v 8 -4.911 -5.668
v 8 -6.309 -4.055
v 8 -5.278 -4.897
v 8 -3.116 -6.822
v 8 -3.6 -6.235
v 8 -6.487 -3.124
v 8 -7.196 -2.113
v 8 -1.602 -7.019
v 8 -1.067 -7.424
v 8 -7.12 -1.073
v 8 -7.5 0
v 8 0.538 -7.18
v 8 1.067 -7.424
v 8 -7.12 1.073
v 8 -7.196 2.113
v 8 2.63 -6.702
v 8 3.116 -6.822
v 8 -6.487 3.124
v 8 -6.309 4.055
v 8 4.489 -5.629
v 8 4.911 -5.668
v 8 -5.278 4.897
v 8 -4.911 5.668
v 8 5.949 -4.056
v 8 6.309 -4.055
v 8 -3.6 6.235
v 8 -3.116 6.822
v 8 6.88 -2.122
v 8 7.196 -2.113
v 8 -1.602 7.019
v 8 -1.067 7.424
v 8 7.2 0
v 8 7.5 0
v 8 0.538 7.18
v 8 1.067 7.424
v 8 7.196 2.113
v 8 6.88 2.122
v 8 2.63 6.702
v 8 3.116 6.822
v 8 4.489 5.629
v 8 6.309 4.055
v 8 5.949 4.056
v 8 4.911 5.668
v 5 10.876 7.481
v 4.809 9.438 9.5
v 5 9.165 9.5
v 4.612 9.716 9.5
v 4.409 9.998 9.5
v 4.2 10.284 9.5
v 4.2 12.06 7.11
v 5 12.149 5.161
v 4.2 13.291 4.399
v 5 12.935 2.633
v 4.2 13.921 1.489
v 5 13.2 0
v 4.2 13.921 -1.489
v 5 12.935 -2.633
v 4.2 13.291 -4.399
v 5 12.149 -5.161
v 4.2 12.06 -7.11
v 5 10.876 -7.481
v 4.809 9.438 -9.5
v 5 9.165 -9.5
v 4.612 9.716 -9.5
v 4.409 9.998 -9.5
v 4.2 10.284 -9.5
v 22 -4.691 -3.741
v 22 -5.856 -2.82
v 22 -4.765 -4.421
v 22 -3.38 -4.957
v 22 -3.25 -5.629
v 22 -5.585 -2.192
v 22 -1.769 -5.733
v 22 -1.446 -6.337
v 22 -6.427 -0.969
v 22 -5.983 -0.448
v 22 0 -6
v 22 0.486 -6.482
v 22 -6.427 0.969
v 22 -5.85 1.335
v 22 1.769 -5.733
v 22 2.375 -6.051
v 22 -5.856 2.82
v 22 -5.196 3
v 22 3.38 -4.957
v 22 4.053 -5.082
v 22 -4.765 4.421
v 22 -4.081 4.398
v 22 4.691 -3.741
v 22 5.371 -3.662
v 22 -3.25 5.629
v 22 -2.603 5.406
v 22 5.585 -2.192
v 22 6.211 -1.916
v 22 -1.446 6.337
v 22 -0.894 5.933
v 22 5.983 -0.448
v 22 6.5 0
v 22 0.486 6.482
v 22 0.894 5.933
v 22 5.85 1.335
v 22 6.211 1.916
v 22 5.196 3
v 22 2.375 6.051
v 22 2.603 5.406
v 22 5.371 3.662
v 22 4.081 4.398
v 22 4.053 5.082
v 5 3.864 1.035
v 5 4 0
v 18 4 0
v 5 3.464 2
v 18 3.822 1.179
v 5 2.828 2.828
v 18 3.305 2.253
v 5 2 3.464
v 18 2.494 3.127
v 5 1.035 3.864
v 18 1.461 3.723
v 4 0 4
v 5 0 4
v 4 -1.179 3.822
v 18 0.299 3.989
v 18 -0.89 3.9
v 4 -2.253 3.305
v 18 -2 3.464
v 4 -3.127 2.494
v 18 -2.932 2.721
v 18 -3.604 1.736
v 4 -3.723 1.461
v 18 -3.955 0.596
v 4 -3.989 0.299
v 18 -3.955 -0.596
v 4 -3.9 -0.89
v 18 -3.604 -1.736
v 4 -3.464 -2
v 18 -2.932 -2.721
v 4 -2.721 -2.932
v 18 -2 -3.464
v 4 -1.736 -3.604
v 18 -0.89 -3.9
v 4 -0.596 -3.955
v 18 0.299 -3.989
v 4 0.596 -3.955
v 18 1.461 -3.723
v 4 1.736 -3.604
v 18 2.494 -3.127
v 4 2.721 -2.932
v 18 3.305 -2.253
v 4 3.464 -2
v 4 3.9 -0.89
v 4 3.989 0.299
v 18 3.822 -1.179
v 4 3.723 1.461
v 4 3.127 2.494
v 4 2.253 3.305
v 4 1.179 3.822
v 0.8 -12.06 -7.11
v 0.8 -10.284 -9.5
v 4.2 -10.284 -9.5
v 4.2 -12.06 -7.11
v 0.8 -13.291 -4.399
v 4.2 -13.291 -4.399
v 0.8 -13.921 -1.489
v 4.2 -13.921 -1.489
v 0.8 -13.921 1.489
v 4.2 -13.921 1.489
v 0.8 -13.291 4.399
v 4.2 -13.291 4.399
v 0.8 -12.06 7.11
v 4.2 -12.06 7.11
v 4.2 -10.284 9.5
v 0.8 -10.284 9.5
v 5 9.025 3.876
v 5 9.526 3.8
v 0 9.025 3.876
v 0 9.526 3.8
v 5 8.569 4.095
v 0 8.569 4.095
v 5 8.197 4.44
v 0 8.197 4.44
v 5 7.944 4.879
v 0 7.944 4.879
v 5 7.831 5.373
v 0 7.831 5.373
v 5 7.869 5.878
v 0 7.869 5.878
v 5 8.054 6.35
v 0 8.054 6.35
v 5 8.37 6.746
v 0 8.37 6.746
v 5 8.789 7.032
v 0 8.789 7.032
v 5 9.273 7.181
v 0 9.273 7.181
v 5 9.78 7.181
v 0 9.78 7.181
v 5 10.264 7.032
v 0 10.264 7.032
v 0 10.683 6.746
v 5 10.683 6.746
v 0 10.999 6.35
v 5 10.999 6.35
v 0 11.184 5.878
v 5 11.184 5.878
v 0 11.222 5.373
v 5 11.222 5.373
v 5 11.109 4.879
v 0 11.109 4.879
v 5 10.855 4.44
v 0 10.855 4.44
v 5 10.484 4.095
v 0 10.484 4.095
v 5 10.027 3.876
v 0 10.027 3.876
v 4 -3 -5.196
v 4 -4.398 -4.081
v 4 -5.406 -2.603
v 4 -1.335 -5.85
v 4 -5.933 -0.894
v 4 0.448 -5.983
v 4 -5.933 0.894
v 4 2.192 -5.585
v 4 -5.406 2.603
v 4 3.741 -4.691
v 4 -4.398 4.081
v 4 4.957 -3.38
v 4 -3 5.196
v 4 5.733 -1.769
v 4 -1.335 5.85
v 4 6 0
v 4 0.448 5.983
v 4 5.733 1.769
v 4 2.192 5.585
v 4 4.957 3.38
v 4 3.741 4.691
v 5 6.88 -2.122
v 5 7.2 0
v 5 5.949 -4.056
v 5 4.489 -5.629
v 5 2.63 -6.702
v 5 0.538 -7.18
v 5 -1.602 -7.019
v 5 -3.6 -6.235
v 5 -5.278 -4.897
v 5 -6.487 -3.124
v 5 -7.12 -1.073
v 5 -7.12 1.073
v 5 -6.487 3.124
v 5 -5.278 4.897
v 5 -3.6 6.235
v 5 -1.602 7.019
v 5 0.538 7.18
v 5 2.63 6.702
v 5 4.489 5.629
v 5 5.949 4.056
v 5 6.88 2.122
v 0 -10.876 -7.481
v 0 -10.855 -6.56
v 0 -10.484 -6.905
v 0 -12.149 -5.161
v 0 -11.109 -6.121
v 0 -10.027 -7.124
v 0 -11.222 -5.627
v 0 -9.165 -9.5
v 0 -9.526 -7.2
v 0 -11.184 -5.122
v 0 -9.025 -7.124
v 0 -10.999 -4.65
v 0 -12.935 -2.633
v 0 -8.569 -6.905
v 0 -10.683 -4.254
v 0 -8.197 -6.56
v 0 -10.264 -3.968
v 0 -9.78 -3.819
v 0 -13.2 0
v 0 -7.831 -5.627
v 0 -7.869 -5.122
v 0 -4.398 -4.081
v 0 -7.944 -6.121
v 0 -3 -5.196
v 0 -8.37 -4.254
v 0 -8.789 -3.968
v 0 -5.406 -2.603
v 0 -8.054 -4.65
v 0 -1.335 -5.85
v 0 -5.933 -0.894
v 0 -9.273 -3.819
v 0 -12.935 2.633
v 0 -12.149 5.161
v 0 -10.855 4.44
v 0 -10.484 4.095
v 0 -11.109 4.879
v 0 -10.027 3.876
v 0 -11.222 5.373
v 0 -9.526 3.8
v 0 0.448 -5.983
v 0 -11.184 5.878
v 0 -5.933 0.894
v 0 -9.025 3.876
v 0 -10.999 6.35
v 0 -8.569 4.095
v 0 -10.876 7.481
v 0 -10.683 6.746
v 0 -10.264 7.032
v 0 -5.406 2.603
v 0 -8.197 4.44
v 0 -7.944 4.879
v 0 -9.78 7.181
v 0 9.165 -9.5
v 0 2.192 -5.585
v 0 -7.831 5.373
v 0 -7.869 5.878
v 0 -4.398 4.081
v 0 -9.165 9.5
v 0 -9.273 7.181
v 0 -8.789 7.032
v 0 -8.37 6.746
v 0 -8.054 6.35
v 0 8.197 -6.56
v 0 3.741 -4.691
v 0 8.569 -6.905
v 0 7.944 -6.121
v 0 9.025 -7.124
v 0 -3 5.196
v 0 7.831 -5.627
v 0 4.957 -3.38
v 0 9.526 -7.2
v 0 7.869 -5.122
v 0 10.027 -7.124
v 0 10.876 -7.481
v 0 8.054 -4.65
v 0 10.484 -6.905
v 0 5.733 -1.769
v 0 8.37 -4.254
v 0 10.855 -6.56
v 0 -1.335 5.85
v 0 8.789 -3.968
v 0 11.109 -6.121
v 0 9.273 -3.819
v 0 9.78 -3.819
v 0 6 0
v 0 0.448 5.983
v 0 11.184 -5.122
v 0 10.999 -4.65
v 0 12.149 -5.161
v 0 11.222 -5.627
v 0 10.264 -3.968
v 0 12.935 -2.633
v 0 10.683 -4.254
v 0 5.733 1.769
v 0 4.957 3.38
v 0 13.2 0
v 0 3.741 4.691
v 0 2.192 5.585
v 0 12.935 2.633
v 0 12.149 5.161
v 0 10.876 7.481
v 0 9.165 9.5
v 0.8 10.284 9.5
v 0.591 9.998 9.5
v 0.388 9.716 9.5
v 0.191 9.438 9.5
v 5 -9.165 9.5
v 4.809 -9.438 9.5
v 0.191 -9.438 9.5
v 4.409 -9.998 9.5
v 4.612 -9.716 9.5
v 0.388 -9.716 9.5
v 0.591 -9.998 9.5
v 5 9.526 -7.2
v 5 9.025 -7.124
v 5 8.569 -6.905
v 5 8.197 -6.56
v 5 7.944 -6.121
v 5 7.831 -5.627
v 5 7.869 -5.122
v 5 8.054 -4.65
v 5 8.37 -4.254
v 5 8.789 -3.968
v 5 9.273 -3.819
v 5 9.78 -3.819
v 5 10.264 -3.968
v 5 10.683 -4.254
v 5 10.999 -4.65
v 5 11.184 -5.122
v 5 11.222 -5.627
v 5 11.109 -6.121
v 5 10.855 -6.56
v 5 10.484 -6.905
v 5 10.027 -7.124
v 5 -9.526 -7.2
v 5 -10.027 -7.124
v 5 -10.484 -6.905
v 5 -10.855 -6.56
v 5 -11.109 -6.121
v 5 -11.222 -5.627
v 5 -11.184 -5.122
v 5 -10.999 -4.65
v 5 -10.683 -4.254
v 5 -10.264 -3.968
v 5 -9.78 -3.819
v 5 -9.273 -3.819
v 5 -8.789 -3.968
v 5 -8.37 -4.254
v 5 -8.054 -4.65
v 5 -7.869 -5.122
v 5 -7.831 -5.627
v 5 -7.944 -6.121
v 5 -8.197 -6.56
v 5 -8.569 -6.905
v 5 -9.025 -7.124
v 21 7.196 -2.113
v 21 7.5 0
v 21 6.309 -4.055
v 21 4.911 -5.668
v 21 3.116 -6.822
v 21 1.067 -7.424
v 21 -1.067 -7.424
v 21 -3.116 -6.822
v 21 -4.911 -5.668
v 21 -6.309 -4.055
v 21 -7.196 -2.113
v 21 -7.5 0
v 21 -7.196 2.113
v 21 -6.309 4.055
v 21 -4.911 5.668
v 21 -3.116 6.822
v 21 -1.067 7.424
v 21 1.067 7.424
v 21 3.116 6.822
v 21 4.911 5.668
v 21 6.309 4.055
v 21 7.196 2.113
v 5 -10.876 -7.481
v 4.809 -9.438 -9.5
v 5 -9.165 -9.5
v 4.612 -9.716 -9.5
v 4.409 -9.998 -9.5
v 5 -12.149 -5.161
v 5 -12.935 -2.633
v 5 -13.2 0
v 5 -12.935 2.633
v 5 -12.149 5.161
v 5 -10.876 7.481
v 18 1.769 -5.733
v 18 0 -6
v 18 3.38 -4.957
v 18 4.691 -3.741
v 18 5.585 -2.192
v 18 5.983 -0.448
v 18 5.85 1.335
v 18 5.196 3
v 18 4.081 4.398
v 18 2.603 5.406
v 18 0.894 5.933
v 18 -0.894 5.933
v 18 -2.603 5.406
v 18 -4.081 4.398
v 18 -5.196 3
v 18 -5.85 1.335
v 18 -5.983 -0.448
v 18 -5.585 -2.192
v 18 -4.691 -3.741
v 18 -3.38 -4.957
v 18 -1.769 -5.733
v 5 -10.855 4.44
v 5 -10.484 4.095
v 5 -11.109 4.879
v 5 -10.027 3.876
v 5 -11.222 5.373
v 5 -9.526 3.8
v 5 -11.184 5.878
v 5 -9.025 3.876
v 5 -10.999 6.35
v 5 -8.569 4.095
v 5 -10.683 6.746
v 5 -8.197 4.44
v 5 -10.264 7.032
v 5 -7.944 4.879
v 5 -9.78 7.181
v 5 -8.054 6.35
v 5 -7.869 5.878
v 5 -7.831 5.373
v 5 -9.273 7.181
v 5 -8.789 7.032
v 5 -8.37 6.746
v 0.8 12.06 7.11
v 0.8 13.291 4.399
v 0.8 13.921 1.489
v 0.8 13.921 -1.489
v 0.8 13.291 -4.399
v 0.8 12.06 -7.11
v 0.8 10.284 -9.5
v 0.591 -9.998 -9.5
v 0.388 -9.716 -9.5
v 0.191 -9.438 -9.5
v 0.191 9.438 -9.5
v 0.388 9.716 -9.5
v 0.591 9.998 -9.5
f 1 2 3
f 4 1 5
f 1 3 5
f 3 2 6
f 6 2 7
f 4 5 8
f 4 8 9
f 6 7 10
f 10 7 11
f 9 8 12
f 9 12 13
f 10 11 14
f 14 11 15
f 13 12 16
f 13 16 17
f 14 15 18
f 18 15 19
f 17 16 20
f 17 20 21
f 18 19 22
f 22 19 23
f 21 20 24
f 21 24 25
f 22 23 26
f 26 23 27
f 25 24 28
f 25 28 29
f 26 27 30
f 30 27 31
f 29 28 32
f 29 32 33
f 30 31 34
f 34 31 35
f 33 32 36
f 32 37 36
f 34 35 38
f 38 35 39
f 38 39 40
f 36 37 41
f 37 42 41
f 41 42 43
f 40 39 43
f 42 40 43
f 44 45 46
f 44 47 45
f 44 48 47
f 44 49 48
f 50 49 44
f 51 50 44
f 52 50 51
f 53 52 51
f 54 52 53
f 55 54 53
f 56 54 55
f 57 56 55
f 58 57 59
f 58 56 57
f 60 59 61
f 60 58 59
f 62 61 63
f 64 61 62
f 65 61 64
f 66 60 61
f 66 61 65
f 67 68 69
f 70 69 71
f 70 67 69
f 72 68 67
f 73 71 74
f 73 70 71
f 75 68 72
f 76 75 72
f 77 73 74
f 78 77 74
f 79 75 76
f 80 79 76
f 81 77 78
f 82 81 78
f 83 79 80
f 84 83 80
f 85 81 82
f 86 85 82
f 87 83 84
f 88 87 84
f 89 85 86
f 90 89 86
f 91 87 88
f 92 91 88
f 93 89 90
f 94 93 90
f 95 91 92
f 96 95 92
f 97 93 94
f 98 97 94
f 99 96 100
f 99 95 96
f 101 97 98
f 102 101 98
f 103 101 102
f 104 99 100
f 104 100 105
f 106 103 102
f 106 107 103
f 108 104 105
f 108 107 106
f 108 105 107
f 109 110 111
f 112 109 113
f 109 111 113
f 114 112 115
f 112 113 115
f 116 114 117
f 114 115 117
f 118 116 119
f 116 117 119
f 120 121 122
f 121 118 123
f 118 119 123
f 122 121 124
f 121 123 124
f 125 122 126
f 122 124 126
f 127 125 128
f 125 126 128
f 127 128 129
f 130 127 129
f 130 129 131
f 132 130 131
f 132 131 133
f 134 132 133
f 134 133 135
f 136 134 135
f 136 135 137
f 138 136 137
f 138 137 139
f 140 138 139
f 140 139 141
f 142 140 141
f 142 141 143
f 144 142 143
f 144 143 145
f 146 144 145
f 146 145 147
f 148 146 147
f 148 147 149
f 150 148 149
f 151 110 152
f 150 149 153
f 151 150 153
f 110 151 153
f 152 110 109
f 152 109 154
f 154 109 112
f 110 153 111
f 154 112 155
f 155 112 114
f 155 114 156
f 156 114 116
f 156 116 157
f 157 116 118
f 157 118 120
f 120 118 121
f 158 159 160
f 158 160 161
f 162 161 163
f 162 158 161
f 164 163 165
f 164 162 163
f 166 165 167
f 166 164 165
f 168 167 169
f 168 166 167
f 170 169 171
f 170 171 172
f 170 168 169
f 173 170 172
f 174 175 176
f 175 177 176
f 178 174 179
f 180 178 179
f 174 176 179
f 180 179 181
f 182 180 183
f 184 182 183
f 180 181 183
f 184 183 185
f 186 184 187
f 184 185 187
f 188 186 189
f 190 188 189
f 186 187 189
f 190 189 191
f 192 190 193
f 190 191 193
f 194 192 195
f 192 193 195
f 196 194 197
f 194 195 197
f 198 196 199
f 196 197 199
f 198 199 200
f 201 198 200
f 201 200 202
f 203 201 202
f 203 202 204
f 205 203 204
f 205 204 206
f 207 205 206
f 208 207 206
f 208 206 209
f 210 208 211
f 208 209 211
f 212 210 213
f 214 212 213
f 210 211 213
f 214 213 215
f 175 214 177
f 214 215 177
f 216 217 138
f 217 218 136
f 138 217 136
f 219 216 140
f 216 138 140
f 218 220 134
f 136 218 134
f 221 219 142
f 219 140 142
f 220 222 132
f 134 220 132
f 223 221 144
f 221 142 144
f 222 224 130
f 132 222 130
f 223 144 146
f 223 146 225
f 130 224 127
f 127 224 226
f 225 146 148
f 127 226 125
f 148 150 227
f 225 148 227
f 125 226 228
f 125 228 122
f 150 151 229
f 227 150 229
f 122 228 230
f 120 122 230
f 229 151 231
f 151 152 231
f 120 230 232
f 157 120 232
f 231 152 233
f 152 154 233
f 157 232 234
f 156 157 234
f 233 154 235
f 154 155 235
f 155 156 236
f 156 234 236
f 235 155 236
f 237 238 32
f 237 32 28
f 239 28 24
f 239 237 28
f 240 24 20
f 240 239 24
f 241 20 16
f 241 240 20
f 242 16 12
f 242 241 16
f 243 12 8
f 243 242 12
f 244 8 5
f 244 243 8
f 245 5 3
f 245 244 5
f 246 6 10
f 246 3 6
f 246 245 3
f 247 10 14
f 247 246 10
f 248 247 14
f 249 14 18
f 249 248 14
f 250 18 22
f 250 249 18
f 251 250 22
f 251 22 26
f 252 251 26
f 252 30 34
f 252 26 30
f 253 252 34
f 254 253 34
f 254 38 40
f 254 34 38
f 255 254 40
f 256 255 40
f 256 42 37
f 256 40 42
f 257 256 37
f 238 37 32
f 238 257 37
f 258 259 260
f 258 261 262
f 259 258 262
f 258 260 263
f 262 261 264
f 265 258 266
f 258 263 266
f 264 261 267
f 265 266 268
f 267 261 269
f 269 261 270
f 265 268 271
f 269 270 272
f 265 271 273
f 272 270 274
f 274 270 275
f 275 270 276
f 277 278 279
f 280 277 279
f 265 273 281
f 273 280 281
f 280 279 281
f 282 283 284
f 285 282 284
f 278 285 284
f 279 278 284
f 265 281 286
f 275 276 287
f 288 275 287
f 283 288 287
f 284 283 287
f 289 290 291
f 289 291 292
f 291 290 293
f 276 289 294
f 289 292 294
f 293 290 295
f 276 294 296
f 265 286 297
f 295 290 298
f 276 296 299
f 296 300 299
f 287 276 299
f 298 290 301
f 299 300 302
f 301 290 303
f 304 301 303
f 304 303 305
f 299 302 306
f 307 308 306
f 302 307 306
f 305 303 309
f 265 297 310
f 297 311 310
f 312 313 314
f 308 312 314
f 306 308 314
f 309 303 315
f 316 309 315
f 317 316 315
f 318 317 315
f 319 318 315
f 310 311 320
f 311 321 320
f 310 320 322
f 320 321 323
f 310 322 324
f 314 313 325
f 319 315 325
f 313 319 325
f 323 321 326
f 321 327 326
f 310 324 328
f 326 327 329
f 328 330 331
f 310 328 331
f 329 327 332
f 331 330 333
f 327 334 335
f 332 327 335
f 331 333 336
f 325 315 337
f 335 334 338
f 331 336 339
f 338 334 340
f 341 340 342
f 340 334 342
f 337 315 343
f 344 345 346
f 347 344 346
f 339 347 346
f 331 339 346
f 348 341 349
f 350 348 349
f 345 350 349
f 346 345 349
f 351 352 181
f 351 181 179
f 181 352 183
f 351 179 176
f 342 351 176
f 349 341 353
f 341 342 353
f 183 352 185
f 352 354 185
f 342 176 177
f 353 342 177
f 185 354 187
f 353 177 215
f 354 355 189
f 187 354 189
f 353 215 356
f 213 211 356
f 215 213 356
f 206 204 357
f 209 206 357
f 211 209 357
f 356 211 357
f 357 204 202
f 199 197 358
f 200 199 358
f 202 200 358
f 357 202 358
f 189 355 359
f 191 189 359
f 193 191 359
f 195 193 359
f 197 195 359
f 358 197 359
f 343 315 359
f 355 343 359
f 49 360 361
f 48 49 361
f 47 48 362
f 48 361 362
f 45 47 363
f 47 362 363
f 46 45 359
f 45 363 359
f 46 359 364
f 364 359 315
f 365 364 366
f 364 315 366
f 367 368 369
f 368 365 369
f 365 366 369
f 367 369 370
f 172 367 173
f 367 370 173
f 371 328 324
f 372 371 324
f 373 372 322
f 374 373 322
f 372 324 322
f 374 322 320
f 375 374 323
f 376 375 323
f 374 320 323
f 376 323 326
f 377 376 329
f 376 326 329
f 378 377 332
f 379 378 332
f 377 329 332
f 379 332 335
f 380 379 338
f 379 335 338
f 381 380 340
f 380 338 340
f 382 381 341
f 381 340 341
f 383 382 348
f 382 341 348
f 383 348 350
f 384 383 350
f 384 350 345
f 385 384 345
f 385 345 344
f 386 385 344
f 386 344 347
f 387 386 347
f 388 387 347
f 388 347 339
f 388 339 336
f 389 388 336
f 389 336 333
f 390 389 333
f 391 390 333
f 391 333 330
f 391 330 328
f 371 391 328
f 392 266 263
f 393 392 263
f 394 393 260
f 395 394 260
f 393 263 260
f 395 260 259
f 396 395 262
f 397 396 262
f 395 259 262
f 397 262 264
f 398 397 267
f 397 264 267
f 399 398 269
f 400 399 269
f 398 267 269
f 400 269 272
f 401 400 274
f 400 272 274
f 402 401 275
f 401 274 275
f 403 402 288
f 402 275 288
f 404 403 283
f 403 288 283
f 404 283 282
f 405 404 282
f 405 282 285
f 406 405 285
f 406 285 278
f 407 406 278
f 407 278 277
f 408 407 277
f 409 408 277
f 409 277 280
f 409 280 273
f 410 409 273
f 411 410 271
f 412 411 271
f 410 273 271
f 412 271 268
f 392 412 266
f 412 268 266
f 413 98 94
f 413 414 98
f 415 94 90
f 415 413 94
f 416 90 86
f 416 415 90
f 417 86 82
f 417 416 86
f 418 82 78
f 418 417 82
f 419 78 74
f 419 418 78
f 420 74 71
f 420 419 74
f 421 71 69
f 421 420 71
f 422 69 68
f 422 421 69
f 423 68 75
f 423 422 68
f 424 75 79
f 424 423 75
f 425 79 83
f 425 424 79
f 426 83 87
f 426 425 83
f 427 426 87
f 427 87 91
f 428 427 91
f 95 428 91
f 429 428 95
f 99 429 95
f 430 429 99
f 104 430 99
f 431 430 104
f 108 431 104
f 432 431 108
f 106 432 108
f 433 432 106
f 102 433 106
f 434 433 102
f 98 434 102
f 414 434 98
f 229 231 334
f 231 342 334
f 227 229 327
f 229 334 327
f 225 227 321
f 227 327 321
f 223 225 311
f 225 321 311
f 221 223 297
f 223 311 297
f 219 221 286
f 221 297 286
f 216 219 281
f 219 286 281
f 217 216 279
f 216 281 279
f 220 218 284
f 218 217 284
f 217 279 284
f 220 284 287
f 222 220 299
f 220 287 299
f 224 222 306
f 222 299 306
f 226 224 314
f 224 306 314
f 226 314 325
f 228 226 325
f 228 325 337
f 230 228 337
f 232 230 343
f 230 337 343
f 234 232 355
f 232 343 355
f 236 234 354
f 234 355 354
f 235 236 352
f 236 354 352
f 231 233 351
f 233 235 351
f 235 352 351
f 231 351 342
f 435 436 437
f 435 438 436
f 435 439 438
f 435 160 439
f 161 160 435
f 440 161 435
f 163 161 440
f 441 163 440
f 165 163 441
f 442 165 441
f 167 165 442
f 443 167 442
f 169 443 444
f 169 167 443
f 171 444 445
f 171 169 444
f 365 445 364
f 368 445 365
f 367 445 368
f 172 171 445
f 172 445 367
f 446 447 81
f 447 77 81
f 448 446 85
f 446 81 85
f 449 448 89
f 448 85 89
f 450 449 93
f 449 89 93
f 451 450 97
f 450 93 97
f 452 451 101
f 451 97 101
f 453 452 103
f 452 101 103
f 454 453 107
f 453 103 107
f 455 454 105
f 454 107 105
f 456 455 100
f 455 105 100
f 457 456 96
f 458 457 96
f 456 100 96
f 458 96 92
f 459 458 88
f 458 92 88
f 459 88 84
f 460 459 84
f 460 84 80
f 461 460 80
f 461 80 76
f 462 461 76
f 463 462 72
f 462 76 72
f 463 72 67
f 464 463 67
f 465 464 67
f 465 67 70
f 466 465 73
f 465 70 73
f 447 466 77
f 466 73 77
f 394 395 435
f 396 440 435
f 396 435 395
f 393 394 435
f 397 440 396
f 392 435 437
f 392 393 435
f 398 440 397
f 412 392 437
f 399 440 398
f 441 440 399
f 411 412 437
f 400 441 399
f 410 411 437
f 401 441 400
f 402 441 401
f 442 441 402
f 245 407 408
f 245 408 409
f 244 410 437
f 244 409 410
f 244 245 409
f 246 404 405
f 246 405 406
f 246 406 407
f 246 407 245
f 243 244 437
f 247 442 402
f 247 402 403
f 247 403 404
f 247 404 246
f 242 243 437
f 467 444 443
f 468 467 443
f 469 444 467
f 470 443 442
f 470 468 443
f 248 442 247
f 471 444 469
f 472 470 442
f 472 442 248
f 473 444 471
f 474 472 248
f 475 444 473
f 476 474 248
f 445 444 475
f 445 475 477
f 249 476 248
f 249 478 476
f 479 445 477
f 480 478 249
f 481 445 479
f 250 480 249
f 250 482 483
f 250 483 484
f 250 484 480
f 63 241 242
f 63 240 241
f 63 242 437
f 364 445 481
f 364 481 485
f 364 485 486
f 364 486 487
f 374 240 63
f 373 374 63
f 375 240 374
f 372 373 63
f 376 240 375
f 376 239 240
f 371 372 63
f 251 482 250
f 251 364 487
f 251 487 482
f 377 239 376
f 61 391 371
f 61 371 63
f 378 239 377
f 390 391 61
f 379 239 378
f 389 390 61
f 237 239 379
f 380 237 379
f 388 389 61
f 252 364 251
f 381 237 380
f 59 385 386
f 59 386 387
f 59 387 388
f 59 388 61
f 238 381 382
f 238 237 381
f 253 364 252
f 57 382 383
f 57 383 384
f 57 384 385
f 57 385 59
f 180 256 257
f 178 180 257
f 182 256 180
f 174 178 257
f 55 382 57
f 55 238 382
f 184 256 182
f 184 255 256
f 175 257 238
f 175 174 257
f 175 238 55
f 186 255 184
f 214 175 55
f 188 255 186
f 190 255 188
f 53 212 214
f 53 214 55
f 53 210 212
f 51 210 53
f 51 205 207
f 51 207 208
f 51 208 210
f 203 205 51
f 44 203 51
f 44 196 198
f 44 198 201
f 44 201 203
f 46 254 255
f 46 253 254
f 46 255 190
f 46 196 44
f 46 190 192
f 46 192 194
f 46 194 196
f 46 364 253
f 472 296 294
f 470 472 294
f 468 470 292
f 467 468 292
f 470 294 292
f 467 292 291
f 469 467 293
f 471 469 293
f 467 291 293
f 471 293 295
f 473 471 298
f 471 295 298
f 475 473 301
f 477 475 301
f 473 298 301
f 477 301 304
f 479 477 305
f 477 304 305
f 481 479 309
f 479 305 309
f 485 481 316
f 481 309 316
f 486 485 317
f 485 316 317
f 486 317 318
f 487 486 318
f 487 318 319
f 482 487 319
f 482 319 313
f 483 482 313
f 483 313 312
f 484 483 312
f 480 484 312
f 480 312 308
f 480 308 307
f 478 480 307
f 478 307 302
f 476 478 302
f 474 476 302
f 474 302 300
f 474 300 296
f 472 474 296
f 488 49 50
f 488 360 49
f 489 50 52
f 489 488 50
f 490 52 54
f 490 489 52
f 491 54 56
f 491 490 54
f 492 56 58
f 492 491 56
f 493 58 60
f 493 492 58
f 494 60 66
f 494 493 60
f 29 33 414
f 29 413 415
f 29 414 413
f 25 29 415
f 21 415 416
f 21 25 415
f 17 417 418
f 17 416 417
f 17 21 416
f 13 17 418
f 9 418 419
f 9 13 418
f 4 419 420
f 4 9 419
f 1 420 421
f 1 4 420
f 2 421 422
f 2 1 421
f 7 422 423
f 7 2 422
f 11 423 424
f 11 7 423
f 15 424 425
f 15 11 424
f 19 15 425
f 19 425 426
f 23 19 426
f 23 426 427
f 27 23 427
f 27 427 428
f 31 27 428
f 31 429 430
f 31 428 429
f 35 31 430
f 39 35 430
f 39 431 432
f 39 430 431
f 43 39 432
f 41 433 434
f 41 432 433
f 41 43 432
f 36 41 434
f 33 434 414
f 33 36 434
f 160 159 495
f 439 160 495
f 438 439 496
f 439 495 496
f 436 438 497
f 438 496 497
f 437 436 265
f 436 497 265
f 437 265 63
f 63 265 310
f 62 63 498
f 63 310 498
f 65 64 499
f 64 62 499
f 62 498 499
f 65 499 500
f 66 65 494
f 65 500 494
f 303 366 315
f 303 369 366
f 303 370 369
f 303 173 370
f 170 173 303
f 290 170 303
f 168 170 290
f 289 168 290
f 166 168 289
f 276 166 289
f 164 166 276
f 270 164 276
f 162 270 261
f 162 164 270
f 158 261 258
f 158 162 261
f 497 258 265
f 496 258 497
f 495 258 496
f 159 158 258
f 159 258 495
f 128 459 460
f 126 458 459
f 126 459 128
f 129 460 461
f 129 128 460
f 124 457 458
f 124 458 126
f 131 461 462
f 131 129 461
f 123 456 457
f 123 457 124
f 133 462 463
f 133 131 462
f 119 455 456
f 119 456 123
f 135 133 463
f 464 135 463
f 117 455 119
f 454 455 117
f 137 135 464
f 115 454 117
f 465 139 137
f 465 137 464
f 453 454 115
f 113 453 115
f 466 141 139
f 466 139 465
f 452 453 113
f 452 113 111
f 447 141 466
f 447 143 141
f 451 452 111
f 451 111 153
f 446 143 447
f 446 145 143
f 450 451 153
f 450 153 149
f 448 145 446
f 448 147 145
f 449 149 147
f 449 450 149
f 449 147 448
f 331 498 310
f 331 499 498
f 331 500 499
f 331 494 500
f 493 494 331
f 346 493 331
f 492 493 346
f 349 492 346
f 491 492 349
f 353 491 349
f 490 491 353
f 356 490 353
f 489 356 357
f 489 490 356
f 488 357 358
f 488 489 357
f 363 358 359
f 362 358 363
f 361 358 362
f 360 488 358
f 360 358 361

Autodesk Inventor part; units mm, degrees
sketch "Sketch_1" plane through (0, 0, 0) normal (1, 0, 0) x (0, 1, 0)
  line L0 (10.2835, 9.5) -> (-10.2835, 9.5)
  arc A0 (-10.2835, 9.5) -> (-10.2835, -9.5) centre (0, 0) ccw
  line L1 (-10.2835, -9.5) -> (10.2835, -9.5)
  arc A1 (10.2835, -9.5) -> (10.2835, 9.5) centre (0, 0) ccw
extrude "Extrusion1" add sketch "Sketch_1" along normal blind 5
sketch "Sketch_9" plane through (0, 0, 0) normal (0, 0, 1) x (1, 0, 0)
  line L0 (50, 0) -> (-50, 0)
  line L1 (0, 13.2) -> (1, 14.2)
  line L2 (1, 14.2) -> (0, 14.2)
  line L3 (0, 14.2) -> (0, 13.2)
revolve "Revolution1" cut sketch "Sketch_9" angle 360 about axis through (50, 0, 0) along (1, 0, 0)
sketch "Sketch_10" plane through (0, 0, 0) normal (0, 0, 1) x (1, 0, 0)
  line L0 (50, 0) -> (-50, 0)
  line L1 (4, 14.2) -> (5, 13.2)
  line L2 (5, 13.2) -> (5, 14.2)
  line L3 (5, 14.2) -> (4, 14.2)
revolve "Revolution2" cut sketch "Sketch_10" angle 360 about axis through (50, 0, 0) along (1, 0, 0)
sketch "Sketch4" plane through (5, 0, 0) normal (1, 0, 0) x (0, 0, -1)
  point P0 (-5.5, 9.5263)
hole "Hole1" at (5, 9.5263, 5.5) direction (-1, 0, 0) diameter 3.4 depth 5
sketch "Sketch5" plane through (5, 0, 0) normal (1, 0, 0) x (0, 0, -1)
  point P0 (5.5, -9.5263)
hole "Hole2" at (5, -9.5263, -5.5) direction (-1, 0, 0) diameter 3.4 depth 5
sketch "Sketch6" plane through (5, 0, 0) normal (1, 0, 0) x (0, 0, -1)
  point P0 (5.5, 9.5263)
hole "Hole3" at (5, 9.5263, -5.5) direction (-1, 0, 0) diameter 3.4 depth 5
sketch "Sketch7" plane through (5, 0, 0) normal (1, 0, 0) x (0, 0, -1)
  point P0 (-5.5, -9.5263)
hole "Hole4" at (5, -9.5263, 5.5) direction (-1, 0, 0) diameter 3.4 depth 5
sketch "Sketch8" plane through (0, 0, 0) normal (-1, 0, 0) x (0, 0, 1)
  point P0 (0, 0)
hole "Hole5" at (0, 0, 0) direction (1, 0, 0) diameter 8 depth 5
sketch "Sketch_14" plane through (0, 0, 0) normal (0, 0, 1) x (1, 0, 0)
  line L0 (50, 0) -> (-50, 0)
  line L1 (5, 7.2) -> (5, 4)
  line L2 (5, 4) -> (22, 4)
  line L3 (22, 4) -> (22, 6.5)
  line L4 (22, 6.5) -> (21, 7.5)
  line L5 (21, 7.5) -> (8, 7.5)
  line L6 (8, 7.5) -> (8, 7.2)
  line L7 (8, 7.2) -> (5, 7.2)
revolve "Revolution3" add sketch "Sketch_14" angle 360 about axis through (50, 0, 0) along (1, 0, 0)
sketch "Sketch_5" plane through (0, 0, 0) normal (1, 0, 0) x (0, 1, 0)
  circle A0 centre (0, 0) radius 6
extrude "Extrusion2" cut sketch "Sketch_5" along normal blind 4
sketch "Sketch_6" plane through (22, 0, 0) normal (1, 0, 0) x (0, 0, -1)
  circle A0 centre (0, 0) radius 6
extrude "Extrusion3" cut sketch "Sketch_6" against normal blind 4
ref_plane "mdk_2_XY" through (0, 0, 0) normal (1, 0, 0) x (0, 0, -1)
ref_plane "mdk_2_YZ" through (0, 0, 0) normal (0, 0, -1) x (0, 1, 0)
ref_plane "mdk_2_ZX" through (0, 0, 0) normal (0, 1, 0) x (1, 0, 0)
properties part number "MDK 0802-30420 Nut"
